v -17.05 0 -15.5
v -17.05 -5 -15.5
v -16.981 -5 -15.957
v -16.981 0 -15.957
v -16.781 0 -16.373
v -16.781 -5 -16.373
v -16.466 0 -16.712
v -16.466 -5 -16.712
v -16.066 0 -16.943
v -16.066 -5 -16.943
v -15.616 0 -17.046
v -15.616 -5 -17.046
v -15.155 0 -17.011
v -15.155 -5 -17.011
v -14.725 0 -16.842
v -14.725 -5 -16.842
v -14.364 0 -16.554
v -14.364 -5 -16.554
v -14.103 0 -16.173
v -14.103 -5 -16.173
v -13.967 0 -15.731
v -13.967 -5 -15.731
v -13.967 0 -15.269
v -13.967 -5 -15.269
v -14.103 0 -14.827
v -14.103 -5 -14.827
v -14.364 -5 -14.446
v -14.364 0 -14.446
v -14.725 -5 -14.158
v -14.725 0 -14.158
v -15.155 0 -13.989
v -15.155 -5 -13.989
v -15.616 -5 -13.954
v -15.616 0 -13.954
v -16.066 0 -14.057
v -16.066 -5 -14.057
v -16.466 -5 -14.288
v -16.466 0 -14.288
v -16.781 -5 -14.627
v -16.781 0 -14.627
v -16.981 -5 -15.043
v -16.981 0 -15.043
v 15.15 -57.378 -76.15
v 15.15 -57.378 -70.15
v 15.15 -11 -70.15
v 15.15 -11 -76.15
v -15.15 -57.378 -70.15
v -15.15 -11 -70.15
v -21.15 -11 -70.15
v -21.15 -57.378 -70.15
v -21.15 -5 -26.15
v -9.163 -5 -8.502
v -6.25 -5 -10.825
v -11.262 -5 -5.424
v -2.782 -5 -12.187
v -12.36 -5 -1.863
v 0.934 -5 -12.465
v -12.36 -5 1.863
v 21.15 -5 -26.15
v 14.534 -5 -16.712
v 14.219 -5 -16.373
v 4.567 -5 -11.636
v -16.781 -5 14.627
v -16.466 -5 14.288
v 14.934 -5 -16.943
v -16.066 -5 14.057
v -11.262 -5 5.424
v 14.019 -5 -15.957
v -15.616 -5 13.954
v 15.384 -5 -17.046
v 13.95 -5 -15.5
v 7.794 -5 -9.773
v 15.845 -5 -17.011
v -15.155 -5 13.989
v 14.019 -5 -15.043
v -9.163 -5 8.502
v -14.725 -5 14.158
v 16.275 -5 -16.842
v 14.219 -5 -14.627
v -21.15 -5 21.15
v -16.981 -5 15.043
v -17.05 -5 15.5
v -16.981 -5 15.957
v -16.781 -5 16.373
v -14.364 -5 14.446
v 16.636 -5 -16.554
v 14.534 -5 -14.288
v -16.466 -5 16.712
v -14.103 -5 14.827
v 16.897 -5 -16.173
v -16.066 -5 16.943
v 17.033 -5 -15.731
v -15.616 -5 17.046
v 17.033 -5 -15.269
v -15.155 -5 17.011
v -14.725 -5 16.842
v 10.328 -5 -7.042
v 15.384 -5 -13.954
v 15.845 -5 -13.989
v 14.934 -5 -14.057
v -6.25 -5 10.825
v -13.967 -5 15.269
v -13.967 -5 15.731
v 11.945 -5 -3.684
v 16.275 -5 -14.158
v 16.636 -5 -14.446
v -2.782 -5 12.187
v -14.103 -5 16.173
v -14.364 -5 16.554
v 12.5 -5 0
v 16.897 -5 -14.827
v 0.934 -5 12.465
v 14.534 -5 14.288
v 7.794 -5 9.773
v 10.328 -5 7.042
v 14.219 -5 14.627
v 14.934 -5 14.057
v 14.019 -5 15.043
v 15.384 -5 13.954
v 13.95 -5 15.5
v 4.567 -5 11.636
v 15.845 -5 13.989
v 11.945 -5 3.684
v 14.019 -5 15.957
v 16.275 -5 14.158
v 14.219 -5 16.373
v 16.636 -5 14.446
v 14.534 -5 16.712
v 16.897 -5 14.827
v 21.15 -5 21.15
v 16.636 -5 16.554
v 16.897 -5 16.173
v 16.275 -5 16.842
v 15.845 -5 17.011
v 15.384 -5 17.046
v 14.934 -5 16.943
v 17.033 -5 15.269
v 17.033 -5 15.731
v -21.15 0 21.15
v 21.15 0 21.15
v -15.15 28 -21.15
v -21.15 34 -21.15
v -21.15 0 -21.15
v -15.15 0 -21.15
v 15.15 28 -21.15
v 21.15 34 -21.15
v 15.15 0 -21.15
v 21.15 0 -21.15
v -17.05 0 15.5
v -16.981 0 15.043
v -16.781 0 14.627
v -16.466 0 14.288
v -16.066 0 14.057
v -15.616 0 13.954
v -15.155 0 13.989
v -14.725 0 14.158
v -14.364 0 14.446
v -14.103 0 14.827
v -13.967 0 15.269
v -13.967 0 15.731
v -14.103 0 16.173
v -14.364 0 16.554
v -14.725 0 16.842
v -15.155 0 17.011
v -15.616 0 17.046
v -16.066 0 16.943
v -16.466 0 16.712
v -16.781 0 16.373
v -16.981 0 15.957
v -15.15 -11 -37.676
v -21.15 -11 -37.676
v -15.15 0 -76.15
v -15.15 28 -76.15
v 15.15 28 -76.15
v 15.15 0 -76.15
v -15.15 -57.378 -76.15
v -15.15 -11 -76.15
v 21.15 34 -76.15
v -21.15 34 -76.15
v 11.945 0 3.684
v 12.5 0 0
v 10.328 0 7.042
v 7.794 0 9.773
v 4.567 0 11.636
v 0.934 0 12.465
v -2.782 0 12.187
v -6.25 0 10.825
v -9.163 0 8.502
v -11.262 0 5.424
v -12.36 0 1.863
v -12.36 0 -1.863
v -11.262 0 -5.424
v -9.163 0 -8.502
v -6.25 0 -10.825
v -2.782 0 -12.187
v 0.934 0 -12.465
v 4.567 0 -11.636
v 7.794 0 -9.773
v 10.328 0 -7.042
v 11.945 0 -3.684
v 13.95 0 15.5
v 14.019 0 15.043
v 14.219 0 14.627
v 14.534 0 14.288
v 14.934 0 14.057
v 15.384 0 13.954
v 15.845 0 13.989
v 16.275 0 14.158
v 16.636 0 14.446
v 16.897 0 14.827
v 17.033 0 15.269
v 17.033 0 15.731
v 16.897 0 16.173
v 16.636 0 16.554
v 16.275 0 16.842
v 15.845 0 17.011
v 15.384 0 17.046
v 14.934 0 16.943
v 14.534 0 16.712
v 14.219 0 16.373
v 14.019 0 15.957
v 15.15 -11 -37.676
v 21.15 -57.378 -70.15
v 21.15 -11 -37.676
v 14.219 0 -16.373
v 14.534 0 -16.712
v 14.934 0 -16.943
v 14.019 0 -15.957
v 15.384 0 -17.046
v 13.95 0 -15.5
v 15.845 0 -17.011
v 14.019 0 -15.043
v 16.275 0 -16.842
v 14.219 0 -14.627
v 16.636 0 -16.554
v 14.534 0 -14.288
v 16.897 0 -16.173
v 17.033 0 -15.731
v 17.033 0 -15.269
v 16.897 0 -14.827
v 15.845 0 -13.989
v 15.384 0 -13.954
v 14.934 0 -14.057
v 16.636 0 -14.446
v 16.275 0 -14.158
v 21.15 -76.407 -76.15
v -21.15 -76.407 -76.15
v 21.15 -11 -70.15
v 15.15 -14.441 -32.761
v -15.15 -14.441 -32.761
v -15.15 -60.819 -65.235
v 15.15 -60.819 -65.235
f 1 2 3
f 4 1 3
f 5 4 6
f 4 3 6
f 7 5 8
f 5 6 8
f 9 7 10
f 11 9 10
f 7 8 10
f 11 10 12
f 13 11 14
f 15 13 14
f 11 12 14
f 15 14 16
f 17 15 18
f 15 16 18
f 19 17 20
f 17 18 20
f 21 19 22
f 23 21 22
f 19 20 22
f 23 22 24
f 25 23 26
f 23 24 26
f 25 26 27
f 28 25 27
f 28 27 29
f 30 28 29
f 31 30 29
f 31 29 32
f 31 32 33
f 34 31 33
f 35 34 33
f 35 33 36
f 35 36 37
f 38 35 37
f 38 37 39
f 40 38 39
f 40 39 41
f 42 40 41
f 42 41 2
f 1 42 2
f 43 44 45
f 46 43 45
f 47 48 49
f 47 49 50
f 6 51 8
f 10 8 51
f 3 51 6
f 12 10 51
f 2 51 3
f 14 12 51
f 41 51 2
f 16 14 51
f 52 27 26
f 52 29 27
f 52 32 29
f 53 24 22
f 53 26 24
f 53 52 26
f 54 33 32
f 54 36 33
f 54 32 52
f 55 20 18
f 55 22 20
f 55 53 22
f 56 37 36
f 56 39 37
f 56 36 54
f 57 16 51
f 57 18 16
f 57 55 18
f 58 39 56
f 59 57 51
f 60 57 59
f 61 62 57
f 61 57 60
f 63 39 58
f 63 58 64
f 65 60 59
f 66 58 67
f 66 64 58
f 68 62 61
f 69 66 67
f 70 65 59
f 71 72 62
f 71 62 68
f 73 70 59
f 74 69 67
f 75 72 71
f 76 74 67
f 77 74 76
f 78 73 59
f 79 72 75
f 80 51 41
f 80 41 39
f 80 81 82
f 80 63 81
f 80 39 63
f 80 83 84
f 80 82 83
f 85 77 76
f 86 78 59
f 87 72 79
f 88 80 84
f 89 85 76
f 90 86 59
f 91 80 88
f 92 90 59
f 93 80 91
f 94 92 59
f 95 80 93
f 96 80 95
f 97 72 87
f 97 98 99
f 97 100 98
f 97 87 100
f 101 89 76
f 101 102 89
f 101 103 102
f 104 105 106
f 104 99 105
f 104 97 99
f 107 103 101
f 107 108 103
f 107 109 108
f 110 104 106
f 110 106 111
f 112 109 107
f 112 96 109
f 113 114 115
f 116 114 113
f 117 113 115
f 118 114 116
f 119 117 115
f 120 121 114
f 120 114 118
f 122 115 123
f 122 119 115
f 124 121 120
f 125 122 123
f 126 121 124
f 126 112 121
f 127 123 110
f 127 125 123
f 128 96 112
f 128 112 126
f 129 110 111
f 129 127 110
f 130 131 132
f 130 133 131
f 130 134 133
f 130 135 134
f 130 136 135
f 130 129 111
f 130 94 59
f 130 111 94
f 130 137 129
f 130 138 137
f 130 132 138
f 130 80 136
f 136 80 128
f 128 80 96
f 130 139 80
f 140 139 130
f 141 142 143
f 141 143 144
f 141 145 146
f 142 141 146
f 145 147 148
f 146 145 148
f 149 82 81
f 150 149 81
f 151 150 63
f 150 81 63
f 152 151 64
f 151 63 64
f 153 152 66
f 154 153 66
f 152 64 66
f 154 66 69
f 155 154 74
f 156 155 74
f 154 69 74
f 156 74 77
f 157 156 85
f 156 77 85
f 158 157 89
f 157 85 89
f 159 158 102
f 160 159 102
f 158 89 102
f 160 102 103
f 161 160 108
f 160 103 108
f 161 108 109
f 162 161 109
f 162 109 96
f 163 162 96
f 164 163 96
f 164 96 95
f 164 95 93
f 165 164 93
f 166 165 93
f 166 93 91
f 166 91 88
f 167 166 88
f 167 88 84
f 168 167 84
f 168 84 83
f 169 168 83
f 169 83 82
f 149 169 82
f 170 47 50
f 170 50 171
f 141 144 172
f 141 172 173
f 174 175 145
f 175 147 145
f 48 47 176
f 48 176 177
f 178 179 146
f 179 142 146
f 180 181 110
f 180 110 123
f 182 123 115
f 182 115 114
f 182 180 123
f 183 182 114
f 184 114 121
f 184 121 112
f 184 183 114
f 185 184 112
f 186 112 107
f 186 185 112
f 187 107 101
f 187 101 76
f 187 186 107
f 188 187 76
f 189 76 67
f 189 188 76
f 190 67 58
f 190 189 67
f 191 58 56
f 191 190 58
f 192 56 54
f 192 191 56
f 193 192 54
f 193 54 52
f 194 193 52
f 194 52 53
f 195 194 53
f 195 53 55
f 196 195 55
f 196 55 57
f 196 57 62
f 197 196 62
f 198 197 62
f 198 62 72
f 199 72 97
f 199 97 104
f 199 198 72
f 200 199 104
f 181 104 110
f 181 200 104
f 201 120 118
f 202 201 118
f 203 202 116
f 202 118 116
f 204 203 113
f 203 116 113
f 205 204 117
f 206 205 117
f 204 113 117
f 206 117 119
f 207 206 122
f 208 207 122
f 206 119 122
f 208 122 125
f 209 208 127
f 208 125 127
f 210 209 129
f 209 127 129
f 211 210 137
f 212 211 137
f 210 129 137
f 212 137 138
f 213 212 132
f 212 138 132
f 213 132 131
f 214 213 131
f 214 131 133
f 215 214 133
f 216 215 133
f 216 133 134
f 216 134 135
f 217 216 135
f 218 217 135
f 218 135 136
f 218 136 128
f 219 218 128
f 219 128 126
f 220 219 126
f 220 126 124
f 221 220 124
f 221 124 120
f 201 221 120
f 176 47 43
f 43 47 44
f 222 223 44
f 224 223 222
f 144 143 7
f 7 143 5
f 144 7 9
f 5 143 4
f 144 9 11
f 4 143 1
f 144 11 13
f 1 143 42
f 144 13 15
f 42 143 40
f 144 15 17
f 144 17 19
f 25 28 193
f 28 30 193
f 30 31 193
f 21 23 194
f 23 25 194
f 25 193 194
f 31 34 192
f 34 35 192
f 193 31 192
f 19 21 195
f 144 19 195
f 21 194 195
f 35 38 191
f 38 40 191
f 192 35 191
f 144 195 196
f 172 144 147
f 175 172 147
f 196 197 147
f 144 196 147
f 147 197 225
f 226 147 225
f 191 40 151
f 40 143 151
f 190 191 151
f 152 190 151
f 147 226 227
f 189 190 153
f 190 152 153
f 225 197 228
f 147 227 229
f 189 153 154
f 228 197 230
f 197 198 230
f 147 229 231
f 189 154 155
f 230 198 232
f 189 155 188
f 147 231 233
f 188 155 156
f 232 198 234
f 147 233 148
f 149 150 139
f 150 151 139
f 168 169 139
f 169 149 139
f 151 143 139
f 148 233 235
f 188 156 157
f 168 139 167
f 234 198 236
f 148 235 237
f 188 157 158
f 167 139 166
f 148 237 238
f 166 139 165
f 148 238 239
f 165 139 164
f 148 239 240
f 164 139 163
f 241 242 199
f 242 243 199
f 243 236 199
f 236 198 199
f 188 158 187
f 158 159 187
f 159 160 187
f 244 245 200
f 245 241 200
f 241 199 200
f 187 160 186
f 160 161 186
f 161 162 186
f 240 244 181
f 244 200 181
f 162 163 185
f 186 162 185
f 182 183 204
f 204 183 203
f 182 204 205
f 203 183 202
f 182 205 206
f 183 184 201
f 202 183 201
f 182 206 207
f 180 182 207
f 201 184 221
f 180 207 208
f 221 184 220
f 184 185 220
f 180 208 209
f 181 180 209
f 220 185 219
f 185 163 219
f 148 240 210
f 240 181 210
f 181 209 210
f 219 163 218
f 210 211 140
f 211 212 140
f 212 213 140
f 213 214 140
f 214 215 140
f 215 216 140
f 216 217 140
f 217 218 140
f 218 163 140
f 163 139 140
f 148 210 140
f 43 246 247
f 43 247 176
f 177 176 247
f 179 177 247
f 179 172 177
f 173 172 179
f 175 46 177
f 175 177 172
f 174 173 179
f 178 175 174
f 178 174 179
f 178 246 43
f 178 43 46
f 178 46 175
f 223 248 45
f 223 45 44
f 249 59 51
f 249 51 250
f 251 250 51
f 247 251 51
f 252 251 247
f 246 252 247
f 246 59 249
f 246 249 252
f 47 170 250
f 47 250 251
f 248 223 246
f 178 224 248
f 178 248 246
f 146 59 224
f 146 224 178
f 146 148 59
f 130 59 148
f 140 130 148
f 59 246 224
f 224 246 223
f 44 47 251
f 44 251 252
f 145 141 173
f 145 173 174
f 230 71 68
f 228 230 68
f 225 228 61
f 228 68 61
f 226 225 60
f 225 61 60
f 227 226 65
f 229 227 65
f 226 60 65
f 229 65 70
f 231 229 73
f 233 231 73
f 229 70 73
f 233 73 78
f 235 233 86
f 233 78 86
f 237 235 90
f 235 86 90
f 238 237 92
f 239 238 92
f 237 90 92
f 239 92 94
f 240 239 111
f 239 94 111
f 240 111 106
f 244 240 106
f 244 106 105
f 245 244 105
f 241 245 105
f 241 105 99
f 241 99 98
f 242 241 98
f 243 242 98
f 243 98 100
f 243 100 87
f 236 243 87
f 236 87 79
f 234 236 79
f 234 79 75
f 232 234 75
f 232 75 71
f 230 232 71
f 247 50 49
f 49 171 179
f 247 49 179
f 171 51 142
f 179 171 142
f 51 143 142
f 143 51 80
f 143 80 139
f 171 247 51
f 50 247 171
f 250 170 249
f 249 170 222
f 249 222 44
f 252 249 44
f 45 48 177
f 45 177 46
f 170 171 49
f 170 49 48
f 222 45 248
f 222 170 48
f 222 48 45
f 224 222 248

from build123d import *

# Parameters (mm, degrees)
F0_W      = 42.3
F0_H      = 42.3
F0_R      = 12.5
F1_DEPTH  = 5
F2_D      = 3.1
F0_H_2    = 5
F3_DEPTH  = 5
F4_DEPTH  = 34
F5_W      = 30.3
F5_H      = 28
F6_DEPTH  = 5
F7_DEPTH  = 50
F9_DEPTH  = 42.3
F10_W     = 30.3
F10_H     = 56.616878205
F11_DEPTH = 25
F12_W     = 30.3
F12_H     = 46.3778315229
F13_DEPTH = 25


with BuildPart() as f1:
    # F0 (on Front) → F1 (new body)
    with BuildSketch(Plane.XZ):
        Rectangle(F0_W, F0_H)
        Circle(F0_R, mode=Mode.SUBTRACT)
    extrude(amount=F1_DEPTH)

    # F2 (through all)
    with Locations(Plane(origin=(0, 0, 0), x_dir=(1, 0, 0), z_dir=(0, 1, 0))):
        with Locations((-15.5, -15.5), (-15.5, 15.5), (15.5, 15.5), (15.5, -15.5)):
            Hole(F2_D / 2)

    # F0 (on Front) → F3 (join)
    with BuildSketch(Plane.XZ):
        with Locations((0, -23.65)):
            Rectangle(F0_W, F0_H_2)
    extrude(amount=F3_DEPTH)

    # F0 (on Front) → F4 (join)
    with BuildSketch(Plane.XZ):
        with Locations((0, -23.65)):
            Rectangle(F0_W, F0_H_2)
    extrude(amount=-F4_DEPTH)

    # F5 (on face) → F6 (cut)
    with BuildSketch(Plane.XY.offset(-21.15)):
        with Locations((0, 14)):
            Rectangle(F5_W, F5_H)
    extrude(amount=-F6_DEPTH, mode=Mode.SUBTRACT)

    # F7 (add): a face of the model
    f7_faces = [f1.faces().sort_by_distance(p)[0] for p in [
        (0, -4.4246488029, -26.15),
    ]]
    extrude(f7_faces, amount=F7_DEPTH)

    # F8 (on face) → F9 (join)
    with BuildSketch(Plane.YZ.offset(21.15)):
        Polygon((-76.4074003371, -76.15), (-5, -76.15), (-5, -26.15), align=None)
        Polygon((-57.3778315229, -70.15), (-11, -37.6758927618), (-11, -70.15), align=None, mode=Mode.SUBTRACT)
    extrude(amount=-F9_DEPTH)

    # F10 (on face) → F11 (cut)
    with BuildSketch(Plane(origin=(0, 14.0829899932, -20.1125940878), x_dir=(1, 0, 0), z_dir=(0, 0.5735764364, -0.8191520443))):
        with Locations((0, 58.9291158964)):
            Rectangle(F10_W, F10_H)
    extrude(amount=-F11_DEPTH, mode=Mode.SUBTRACT)

    # F12 (on face) → F13 (cut)
    with BuildSketch(Plane.XY.offset(-70.15)):
        with Locations((0, -34.1889157615)):
            Rectangle(F12_W, F12_H)
    extrude(amount=-F13_DEPTH, mode=Mode.SUBTRACT)


solid = f1.part
